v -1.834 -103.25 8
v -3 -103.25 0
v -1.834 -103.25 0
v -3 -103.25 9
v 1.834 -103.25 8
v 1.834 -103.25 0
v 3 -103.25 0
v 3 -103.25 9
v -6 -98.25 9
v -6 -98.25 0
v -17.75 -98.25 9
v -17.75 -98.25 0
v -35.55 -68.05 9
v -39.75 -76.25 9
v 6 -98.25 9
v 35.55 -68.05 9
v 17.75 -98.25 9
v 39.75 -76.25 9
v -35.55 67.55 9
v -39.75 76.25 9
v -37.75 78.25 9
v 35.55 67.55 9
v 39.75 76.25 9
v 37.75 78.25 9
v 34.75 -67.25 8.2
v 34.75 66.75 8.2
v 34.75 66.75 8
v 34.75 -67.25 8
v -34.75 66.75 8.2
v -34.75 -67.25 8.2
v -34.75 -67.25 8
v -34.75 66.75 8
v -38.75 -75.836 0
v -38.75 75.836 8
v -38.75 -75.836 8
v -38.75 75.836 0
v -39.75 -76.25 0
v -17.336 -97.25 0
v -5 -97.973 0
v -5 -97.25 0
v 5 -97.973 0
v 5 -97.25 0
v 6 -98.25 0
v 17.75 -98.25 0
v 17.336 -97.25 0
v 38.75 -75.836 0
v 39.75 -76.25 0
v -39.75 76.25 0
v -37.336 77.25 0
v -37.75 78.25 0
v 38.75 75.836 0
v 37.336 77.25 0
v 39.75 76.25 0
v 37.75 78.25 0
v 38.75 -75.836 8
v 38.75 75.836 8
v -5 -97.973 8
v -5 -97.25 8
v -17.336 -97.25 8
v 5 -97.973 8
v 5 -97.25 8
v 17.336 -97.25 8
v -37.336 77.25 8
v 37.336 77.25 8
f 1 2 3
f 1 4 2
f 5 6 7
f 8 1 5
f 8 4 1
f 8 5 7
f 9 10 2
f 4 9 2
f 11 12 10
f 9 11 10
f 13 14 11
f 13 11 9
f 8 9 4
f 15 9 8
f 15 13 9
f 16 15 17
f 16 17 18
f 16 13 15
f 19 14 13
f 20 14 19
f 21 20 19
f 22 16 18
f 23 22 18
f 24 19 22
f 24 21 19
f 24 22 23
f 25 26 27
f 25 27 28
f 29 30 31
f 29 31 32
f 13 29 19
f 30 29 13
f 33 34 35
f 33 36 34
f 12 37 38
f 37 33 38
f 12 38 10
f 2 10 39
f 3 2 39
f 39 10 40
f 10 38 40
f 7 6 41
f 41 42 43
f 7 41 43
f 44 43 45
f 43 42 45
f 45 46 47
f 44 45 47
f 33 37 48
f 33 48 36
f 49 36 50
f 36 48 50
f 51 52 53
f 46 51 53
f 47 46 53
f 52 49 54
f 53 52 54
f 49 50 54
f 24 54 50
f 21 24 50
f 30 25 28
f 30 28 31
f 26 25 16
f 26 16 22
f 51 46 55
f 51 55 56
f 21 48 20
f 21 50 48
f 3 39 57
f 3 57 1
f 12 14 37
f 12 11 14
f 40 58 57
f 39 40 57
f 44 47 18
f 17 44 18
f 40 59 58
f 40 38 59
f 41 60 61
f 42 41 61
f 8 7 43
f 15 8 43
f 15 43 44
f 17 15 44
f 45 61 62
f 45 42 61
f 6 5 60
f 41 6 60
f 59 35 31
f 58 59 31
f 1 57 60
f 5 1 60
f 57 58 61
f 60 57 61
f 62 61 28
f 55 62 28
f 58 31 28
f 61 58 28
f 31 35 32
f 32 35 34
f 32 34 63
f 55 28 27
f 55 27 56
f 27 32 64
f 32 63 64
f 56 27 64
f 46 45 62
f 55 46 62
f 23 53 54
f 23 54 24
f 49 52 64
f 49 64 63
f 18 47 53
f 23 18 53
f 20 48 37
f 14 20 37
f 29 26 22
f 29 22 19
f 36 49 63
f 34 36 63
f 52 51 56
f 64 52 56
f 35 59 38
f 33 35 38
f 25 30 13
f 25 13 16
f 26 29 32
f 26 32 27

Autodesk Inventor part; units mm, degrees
ref_plane "YZ Plane" through (0, 0, 0) normal (1, 0, 0) x (0, 1, 0)
ref_plane "XZ Plane" through (0, 0, 0) normal (0, 1, 0) x (-1, 0, 0)
ref_plane "XY Plane" through (0, 0, 0) normal (0, 0, 1) x (1, 0, 0)
sketch "Boceto1" plane through (0, 0, 0) normal (0, 0, 1) x (1, 0, 0)
  line L0 (-39.75, -78.25) -> (39.75, -78.25)
  line L1 (39.75, -78.25) -> (39.75, 78.25)
  line L2 (39.75, 78.25) -> (-39.75, 78.25)
  line L3 (-39.75, 78.25) -> (-39.75, -78.25)
  line L4 (-39.75, -78.25) -> (39.75, 78.25) construction
  line L5 (39.75, -78.25) -> (-39.75, 78.25) construction
  point P0 (0, 0)
  dimension "d0" = 79.5
  dimension "d1" = 156.5
extrude "Extrusión1" add sketch "Boceto1" along normal blind 9
sketch "Boceto2" plane through (0, 0, 9) normal (0, 0, 1) x (1, 0, 0)
  line L0 (-39.75, -78.25) -> (39.75, -78.25) projected
  line L1 (-6, -78.25) -> (-6, -98.25)
  line L2 (-6, -98.25) -> (-3, -103.25)
  line L3 (-3, -103.25) -> (3, -103.25)
  line L4 (3, -103.25) -> (6, -98.25)
  line L5 (6, -98.25) -> (6, -78.25)
  point P0 (0, 0)
  point P1 (6, -88.25)
  point P2 (-6, -88.25)
  point P3 (0, -78.25)
  point P4 (0, -103.25)
  point P5 (0, -78.25)
  dimension "d4" = 12
  dimension "d5" = 6
  dimension "d6" = 20
  dimension "d7" = 5
  dimension "d8" = 6
extrude "Extrusión2" add sketch "Boceto2" against normal up to surface (9 mm away)
chamfer "Chaflán2" distance 2 angle 45 4 edges at (-39.75, -78.25, 4.5) (-39.75, 78.25, 4.5) (39.75, -78.25, 4.5) (39.75, 78.25, 4.5)
shell "Vaciado1" thickness 1 removed faces 2 at (-2, 24.75, 0) at (-1, -103.25, 6)
sketch "Boceto3" plane through (0, 0, 9) normal (0, 0, 1) x (1, 0, 0)
  line L0 (-34.75, 66.75) -> (34.75, 66.75)
  line L1 (34.75, 66.75) -> (34.75, -67.25)
  line L2 (34.75, -67.25) -> (-34.75, -67.25)
  line L3 (-34.75, -67.25) -> (-34.75, 66.75)
  line L4 (-34.75, 66.75) -> (34.75, -67.25) construction
  line L5 (34.75, 66.75) -> (-34.75, -67.25) construction
  line L6 (37.3358, 77.25) -> (38.75, 75.8358) projected
  line L7 (38.75, -75.8358) -> (38.75, 75.8358) projected
  line L8 (38.75, -75.8358) -> (37.3358, -77.25) projected
  line L9 (5, -77.25) -> (37.3358, -77.25) projected
  line L10 (5, -97.973) -> (5, -77.25) projected
  line L11 (1.8338, -103.25) -> (5, -97.973) projected
  line L12 (-1.8338, -103.25) -> (1.8338, -103.25) projected
  line L13 (-5, -97.973) -> (-1.8338, -103.25) projected
  line L14 (-5, -77.25) -> (-5, -97.973) projected
  line L15 (-37.3358, -77.25) -> (-5, -77.25) projected
  line L16 (-37.3358, -77.25) -> (-38.75, -75.8358) projected
  line L17 (-38.75, 75.8358) -> (-38.75, -75.8358) projected
  line L18 (-38.75, 75.8358) -> (-37.3358, 77.25) projected
  line L19 (37.3358, 77.25) -> (-37.3358, 77.25) projected
  point P0 (0, 0)
  point P1 (0, -0.25)
  dimension "d18" = 4
  dimension "d19" = 4
  dimension "d20" = 10.5
  dimension "d21" = 10
extrude "Extrusión3" cut sketch "Boceto3" against normal blind 10 contours L0 L1 L2 L3
chamfer "Chaflán3" distance 0.8 angle 45 4 edges at (0, 66.75, 9) (34.75, -0.25, 9) (0, -67.25, 9) (-34.75, -0.25, 9)
move faces "Desplazar1" translate (0, -20, 0) faces at (-27.1667, -78.25, 3) (16.5833, -78.25, 3) (-26.5572, -77.25, 2.6667) (26.5572, -77.25, 5.3333)
equation "\"d5\" = 0.5 * d4"
properties part number "BiselTelefono"
